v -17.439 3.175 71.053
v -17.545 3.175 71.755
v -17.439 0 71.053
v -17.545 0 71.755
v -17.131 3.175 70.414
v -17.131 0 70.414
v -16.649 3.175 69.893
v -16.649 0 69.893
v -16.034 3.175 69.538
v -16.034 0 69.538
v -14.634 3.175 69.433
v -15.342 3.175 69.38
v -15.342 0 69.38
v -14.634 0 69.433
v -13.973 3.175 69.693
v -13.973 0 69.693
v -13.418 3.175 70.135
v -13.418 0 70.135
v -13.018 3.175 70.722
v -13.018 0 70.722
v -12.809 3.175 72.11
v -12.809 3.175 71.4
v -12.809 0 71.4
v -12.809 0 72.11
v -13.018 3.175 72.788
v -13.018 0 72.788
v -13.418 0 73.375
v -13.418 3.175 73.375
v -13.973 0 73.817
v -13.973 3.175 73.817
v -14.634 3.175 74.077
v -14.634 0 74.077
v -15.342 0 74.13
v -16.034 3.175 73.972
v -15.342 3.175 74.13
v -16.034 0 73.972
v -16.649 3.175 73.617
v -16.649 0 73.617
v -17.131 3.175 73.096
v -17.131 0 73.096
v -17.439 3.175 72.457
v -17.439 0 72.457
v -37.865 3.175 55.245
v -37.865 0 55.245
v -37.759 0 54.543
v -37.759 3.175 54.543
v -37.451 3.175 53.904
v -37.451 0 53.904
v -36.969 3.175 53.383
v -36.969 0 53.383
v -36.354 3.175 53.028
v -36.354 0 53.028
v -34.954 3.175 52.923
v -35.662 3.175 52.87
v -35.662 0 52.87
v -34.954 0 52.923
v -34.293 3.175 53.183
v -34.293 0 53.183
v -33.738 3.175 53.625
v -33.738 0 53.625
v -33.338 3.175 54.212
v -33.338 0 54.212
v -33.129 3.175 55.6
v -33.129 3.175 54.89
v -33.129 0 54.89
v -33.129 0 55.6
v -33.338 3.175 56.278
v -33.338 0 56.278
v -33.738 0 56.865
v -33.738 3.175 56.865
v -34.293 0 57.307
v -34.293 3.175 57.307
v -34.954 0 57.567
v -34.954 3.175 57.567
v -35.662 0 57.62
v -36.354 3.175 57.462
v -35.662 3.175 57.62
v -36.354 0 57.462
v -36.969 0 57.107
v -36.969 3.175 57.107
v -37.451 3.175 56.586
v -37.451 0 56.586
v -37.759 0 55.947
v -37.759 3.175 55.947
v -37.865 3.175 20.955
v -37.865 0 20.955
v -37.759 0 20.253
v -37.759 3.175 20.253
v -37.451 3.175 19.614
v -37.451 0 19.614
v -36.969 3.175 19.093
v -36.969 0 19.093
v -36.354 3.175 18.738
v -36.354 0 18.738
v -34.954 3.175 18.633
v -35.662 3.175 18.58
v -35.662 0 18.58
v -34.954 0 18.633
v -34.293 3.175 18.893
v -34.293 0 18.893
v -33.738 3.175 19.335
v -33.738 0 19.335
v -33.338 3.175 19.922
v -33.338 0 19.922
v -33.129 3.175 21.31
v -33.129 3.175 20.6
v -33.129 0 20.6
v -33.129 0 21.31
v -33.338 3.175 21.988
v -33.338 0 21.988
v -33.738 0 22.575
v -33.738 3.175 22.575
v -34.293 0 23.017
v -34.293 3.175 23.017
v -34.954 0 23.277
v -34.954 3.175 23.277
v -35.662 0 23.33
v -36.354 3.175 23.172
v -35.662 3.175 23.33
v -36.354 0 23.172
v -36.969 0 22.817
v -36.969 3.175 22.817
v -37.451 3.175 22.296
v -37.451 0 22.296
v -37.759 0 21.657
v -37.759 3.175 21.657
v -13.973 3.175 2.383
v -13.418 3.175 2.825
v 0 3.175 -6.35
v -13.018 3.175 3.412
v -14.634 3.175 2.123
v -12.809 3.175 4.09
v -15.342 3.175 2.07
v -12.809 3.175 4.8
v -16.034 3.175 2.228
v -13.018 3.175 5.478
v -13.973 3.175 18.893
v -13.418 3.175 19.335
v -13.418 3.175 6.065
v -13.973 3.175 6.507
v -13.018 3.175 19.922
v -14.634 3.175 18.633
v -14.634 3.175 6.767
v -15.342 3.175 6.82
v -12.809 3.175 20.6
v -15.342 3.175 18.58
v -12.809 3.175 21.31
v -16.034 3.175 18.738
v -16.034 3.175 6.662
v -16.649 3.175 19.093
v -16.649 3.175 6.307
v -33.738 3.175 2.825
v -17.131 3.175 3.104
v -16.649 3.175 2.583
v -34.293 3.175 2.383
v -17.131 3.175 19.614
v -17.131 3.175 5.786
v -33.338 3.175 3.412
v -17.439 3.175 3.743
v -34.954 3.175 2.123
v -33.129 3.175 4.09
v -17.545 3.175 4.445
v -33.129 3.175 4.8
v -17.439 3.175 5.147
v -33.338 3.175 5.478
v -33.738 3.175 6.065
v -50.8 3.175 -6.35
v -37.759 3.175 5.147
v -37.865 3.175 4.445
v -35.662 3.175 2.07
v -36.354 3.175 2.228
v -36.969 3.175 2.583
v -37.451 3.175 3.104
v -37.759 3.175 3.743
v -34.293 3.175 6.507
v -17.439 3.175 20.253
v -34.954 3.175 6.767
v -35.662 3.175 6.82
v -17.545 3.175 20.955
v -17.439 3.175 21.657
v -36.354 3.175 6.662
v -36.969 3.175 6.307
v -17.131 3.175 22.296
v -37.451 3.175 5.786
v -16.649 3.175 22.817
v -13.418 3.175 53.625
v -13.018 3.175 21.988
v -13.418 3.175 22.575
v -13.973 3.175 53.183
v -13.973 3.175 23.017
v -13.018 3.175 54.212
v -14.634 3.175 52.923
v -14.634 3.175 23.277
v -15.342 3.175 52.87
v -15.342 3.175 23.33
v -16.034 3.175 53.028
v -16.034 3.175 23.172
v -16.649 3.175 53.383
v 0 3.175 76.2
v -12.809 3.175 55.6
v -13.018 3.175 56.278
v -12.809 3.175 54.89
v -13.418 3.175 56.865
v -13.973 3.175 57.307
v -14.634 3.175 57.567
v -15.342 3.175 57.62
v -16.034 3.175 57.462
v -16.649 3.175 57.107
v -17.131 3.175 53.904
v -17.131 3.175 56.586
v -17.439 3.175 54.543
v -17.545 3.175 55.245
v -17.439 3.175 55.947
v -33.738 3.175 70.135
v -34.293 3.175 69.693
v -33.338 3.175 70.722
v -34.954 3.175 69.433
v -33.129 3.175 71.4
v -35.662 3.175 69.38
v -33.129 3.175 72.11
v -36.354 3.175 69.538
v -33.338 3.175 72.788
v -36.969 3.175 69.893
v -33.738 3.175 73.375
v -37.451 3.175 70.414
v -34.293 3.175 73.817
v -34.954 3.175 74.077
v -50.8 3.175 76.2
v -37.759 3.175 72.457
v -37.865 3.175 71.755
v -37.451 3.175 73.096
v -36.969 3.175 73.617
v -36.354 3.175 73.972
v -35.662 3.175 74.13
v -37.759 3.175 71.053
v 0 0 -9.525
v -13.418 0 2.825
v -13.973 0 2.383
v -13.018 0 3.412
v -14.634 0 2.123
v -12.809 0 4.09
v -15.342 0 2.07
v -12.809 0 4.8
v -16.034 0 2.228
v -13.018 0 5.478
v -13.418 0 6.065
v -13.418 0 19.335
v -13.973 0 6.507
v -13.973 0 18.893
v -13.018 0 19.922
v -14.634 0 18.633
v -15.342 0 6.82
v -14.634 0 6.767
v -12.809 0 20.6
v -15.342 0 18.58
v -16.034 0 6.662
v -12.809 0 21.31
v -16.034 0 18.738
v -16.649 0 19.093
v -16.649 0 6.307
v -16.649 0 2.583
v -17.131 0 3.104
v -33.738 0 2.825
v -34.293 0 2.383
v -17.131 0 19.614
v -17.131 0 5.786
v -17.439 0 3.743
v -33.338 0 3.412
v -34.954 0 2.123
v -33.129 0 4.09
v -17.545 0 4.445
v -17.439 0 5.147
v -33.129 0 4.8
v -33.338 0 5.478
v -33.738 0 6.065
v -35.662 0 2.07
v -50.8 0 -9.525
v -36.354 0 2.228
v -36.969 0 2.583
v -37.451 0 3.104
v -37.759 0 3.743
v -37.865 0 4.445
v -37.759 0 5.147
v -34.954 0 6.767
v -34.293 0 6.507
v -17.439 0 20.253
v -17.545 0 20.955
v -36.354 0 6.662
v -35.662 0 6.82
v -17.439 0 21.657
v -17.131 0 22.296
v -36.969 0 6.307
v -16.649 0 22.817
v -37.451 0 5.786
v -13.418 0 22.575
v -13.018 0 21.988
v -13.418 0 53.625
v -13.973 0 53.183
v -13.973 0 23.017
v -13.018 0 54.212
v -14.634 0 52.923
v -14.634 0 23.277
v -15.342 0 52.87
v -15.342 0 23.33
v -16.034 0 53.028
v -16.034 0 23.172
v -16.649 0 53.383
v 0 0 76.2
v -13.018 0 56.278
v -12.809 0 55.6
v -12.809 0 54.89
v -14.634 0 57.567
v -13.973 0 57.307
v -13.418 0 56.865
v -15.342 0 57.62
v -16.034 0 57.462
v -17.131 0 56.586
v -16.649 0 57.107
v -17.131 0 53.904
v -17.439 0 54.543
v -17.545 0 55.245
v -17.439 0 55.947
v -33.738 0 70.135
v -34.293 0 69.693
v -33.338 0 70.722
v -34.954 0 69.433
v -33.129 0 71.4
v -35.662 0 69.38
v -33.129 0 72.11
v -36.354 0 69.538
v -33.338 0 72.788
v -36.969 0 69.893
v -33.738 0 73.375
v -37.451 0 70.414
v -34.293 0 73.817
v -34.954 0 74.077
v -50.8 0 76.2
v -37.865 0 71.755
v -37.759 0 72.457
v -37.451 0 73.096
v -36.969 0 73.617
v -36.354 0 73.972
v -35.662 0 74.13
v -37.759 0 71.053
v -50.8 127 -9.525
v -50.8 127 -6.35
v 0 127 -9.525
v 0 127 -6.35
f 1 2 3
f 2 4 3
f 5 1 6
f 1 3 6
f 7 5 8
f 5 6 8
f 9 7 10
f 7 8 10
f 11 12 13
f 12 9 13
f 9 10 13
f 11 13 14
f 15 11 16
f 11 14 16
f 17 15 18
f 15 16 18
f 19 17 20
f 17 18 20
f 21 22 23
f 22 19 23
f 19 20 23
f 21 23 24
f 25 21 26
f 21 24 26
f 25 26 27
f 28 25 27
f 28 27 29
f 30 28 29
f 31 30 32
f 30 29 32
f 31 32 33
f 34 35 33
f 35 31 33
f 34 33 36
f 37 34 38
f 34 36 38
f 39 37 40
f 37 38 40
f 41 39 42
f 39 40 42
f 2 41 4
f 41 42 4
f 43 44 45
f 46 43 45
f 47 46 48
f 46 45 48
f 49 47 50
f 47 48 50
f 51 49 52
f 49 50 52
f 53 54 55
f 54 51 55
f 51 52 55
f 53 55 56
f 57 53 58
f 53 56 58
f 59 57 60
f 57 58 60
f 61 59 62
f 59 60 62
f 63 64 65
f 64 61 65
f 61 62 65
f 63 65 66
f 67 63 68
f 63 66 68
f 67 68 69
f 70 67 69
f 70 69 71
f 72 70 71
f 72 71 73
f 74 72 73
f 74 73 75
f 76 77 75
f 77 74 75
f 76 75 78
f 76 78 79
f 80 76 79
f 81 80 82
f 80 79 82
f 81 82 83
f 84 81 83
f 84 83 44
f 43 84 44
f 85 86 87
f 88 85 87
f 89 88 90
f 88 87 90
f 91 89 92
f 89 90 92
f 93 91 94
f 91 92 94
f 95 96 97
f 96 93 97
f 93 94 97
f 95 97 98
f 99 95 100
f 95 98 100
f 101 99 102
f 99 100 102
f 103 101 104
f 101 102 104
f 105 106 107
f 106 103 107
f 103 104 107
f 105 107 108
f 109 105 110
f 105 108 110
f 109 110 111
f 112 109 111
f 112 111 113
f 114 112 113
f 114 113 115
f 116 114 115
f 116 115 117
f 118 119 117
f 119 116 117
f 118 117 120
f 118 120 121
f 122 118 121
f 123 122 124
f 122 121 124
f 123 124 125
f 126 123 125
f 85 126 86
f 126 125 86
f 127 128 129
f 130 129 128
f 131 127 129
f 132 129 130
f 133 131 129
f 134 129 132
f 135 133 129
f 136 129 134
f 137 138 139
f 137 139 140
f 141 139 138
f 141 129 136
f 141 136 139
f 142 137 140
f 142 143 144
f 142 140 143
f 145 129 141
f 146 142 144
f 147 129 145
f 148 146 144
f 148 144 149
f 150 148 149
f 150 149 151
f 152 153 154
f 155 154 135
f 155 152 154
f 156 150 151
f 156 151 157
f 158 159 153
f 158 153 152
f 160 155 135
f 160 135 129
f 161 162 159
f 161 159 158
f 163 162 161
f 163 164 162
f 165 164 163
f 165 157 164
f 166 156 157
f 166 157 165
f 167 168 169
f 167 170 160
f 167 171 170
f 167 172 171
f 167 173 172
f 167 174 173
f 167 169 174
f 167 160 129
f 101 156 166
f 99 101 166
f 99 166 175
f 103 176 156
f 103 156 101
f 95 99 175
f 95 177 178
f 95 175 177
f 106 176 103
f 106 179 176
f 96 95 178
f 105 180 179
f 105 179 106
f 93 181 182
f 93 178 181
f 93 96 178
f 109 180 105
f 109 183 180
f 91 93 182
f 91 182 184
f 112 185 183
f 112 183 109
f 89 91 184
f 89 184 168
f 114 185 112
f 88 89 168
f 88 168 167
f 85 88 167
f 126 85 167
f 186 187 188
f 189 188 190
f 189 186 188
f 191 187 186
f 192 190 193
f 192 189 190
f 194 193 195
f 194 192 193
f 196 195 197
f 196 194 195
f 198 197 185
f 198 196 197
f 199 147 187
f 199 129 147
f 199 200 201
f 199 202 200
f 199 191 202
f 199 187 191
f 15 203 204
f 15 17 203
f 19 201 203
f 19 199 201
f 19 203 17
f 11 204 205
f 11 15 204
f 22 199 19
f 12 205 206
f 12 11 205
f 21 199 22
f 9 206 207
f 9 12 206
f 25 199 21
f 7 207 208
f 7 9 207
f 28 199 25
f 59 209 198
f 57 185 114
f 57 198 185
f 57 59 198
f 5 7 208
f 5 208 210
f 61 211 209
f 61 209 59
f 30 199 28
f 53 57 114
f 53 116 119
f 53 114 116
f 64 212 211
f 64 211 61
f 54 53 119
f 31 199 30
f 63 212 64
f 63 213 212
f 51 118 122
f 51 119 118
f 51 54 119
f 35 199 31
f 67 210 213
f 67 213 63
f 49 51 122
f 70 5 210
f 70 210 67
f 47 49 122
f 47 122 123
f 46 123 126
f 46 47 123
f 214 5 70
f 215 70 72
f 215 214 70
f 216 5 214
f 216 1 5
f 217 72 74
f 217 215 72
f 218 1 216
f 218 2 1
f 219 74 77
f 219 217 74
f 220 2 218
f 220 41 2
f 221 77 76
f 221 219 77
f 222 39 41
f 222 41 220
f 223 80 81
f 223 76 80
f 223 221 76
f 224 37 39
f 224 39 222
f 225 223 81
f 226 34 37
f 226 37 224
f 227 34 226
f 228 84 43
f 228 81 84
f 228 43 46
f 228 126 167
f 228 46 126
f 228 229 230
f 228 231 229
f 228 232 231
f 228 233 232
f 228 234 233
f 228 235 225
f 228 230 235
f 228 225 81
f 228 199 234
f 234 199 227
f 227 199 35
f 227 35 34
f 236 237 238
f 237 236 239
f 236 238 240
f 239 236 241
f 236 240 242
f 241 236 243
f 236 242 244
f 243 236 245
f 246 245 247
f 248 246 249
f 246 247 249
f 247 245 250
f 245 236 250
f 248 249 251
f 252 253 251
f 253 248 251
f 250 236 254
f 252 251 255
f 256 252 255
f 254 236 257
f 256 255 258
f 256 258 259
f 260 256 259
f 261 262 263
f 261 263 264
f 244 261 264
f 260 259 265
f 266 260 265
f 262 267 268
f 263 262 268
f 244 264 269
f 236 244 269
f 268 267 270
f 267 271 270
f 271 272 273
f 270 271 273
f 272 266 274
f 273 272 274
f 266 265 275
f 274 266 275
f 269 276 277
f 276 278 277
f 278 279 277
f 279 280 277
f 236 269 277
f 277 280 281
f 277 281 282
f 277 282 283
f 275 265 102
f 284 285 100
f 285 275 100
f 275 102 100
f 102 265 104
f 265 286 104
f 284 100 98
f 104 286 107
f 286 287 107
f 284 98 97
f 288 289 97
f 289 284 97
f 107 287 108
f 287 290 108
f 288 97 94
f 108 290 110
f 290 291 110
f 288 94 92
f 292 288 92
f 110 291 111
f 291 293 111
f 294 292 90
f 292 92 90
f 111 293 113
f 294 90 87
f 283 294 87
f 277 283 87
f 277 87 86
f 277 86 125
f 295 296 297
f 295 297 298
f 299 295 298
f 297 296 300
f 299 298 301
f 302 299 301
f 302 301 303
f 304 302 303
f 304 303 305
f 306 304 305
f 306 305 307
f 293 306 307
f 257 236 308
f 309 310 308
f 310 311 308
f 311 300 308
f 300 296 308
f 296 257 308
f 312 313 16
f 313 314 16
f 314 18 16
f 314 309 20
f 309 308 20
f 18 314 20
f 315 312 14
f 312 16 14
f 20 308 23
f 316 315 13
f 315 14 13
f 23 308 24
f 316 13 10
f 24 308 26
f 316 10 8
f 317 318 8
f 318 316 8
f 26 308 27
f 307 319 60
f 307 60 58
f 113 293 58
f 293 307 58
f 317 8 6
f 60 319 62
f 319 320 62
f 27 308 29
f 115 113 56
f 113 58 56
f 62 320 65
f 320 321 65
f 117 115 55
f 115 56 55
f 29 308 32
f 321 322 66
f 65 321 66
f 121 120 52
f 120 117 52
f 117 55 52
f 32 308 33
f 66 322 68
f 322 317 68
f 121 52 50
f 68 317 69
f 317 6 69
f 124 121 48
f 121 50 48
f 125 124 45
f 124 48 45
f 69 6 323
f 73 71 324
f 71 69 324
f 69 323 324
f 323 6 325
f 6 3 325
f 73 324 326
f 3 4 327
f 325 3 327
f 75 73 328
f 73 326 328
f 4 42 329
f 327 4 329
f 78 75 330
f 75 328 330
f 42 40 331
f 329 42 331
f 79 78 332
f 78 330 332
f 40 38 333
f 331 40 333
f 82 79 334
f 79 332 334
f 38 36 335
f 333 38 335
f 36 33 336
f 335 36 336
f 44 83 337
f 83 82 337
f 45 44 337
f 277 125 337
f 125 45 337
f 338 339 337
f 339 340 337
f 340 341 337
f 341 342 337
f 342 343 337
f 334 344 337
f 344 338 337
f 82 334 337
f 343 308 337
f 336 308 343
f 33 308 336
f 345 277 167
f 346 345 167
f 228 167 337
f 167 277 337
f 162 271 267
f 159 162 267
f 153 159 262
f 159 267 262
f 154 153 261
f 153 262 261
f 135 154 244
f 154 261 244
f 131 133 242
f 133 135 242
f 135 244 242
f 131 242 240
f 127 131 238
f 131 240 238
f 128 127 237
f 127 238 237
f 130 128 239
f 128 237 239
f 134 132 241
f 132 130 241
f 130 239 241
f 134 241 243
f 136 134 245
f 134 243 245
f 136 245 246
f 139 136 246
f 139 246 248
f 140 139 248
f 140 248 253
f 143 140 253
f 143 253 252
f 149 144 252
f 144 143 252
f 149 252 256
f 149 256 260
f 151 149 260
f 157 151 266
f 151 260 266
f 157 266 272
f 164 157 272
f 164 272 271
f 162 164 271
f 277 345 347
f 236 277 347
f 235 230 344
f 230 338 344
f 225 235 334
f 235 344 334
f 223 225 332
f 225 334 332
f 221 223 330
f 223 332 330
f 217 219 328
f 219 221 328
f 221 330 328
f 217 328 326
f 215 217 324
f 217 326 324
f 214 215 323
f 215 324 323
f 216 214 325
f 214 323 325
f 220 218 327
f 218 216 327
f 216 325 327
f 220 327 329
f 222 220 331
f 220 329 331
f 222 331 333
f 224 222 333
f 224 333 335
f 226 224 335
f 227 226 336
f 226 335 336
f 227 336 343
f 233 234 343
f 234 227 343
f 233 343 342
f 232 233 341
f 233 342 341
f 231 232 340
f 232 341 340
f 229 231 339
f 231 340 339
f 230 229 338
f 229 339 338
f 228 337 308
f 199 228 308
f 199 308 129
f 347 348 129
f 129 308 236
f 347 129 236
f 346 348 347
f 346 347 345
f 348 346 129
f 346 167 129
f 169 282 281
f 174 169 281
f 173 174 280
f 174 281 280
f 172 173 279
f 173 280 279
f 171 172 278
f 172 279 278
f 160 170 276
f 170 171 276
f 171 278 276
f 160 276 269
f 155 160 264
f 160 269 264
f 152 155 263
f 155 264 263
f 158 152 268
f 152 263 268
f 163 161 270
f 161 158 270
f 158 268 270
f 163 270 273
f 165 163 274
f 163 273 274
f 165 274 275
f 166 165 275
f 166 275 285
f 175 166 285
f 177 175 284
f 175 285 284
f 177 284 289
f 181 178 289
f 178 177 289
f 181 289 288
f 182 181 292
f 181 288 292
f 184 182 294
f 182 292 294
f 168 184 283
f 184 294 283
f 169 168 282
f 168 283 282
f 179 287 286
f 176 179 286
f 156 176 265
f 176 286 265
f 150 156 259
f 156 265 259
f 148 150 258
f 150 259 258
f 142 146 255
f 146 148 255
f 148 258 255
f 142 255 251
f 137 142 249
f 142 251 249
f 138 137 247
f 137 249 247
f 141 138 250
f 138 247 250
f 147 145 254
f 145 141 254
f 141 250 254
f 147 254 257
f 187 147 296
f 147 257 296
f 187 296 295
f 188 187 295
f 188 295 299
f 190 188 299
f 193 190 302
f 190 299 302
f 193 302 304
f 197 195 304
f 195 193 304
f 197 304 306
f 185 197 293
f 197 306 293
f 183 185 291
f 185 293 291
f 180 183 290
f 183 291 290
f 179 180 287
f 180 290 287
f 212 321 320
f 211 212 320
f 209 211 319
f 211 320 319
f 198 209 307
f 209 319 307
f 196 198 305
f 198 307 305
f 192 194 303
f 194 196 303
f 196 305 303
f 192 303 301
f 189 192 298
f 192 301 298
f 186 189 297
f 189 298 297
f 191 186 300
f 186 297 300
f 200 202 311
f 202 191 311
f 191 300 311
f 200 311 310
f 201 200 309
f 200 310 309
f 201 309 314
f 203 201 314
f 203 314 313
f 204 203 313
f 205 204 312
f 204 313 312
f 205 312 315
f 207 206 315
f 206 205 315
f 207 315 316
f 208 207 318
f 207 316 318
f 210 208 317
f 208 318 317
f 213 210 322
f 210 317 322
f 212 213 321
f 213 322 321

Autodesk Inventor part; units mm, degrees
ref_plane "YZ Plane" through (0, 0, 0) normal (1, 0, 0) x (0, 1, 0)
ref_plane "XZ Plane" through (0, 0, 0) normal (0, 1, 0) x (-1, 0, 0)
ref_plane "XY Plane" through (0, 0, 0) normal (0, 0, 1) x (1, 0, 0)
sketch "Sketch1" plane through (0, 0, 0) normal (0, 1, 0) x (-1, 0, 0)
  line L0 (0, 0) -> (50.8, 0)
  line L1 (50.8, 0) -> (50.8, 76.2)
  line L2 (50.8, 76.2) -> (0, 76.2)
  line L3 (0, 76.2) -> (0, 0)
  circle A0 centre (35.4838, 71.755) radius 2.3813
  circle A1 centre (35.4838, 55.245) radius 2.3813
  circle A2 centre (15.1638, 71.755) radius 2.3813
  circle A3 centre (15.1638, 55.245) radius 2.3813
  line L4 (50.8, 38.1) -> (0, 38.1)
  circle A4 centre (35.4838, 4.445) radius 2.3813
  circle A5 centre (35.4838, 20.955) radius 2.3813
  circle A6 centre (15.1638, 4.445) radius 2.3813
  circle A7 centre (15.1638, 20.955) radius 2.3813
  line L5 (0, 0) -> (50.8, 0)
  line L6 (50.8, 0) -> (50.8, -6.35)
  line L7 (50.8, -6.35) -> (0, -6.35)
  line L8 (0, -6.35) -> (0, 0)
  line L9 (0, -6.35) -> (50.8, -6.35)
  line L10 (50.8, -6.35) -> (50.8, -9.525)
  line L11 (50.8, -9.525) -> (0, -9.525)
  line L12 (0, -9.525) -> (0, -6.35)
  dimension "d0" = 50.8
  dimension "d1" = 76.2
  dimension "d2" = 4.7625
  dimension "d3" = 15.3162
  dimension "d4" = 4.445
  dimension "d7" = 16.51
  dimension "d10" = 20.32
  dimension "d15" = 50.8
  dimension "d16" = 6.35
  dimension "d17" = 50.8
  dimension "d18" = 3.175
extrude "Extrusion1" add sketch "Sketch1" along normal blind 3.175
extrude "Extrusion2" add sketch "Sketch1" along normal blind 127 contours L7 L10 L11 L12
properties part number "Gripper Slider Connecting Plate & Bar"
